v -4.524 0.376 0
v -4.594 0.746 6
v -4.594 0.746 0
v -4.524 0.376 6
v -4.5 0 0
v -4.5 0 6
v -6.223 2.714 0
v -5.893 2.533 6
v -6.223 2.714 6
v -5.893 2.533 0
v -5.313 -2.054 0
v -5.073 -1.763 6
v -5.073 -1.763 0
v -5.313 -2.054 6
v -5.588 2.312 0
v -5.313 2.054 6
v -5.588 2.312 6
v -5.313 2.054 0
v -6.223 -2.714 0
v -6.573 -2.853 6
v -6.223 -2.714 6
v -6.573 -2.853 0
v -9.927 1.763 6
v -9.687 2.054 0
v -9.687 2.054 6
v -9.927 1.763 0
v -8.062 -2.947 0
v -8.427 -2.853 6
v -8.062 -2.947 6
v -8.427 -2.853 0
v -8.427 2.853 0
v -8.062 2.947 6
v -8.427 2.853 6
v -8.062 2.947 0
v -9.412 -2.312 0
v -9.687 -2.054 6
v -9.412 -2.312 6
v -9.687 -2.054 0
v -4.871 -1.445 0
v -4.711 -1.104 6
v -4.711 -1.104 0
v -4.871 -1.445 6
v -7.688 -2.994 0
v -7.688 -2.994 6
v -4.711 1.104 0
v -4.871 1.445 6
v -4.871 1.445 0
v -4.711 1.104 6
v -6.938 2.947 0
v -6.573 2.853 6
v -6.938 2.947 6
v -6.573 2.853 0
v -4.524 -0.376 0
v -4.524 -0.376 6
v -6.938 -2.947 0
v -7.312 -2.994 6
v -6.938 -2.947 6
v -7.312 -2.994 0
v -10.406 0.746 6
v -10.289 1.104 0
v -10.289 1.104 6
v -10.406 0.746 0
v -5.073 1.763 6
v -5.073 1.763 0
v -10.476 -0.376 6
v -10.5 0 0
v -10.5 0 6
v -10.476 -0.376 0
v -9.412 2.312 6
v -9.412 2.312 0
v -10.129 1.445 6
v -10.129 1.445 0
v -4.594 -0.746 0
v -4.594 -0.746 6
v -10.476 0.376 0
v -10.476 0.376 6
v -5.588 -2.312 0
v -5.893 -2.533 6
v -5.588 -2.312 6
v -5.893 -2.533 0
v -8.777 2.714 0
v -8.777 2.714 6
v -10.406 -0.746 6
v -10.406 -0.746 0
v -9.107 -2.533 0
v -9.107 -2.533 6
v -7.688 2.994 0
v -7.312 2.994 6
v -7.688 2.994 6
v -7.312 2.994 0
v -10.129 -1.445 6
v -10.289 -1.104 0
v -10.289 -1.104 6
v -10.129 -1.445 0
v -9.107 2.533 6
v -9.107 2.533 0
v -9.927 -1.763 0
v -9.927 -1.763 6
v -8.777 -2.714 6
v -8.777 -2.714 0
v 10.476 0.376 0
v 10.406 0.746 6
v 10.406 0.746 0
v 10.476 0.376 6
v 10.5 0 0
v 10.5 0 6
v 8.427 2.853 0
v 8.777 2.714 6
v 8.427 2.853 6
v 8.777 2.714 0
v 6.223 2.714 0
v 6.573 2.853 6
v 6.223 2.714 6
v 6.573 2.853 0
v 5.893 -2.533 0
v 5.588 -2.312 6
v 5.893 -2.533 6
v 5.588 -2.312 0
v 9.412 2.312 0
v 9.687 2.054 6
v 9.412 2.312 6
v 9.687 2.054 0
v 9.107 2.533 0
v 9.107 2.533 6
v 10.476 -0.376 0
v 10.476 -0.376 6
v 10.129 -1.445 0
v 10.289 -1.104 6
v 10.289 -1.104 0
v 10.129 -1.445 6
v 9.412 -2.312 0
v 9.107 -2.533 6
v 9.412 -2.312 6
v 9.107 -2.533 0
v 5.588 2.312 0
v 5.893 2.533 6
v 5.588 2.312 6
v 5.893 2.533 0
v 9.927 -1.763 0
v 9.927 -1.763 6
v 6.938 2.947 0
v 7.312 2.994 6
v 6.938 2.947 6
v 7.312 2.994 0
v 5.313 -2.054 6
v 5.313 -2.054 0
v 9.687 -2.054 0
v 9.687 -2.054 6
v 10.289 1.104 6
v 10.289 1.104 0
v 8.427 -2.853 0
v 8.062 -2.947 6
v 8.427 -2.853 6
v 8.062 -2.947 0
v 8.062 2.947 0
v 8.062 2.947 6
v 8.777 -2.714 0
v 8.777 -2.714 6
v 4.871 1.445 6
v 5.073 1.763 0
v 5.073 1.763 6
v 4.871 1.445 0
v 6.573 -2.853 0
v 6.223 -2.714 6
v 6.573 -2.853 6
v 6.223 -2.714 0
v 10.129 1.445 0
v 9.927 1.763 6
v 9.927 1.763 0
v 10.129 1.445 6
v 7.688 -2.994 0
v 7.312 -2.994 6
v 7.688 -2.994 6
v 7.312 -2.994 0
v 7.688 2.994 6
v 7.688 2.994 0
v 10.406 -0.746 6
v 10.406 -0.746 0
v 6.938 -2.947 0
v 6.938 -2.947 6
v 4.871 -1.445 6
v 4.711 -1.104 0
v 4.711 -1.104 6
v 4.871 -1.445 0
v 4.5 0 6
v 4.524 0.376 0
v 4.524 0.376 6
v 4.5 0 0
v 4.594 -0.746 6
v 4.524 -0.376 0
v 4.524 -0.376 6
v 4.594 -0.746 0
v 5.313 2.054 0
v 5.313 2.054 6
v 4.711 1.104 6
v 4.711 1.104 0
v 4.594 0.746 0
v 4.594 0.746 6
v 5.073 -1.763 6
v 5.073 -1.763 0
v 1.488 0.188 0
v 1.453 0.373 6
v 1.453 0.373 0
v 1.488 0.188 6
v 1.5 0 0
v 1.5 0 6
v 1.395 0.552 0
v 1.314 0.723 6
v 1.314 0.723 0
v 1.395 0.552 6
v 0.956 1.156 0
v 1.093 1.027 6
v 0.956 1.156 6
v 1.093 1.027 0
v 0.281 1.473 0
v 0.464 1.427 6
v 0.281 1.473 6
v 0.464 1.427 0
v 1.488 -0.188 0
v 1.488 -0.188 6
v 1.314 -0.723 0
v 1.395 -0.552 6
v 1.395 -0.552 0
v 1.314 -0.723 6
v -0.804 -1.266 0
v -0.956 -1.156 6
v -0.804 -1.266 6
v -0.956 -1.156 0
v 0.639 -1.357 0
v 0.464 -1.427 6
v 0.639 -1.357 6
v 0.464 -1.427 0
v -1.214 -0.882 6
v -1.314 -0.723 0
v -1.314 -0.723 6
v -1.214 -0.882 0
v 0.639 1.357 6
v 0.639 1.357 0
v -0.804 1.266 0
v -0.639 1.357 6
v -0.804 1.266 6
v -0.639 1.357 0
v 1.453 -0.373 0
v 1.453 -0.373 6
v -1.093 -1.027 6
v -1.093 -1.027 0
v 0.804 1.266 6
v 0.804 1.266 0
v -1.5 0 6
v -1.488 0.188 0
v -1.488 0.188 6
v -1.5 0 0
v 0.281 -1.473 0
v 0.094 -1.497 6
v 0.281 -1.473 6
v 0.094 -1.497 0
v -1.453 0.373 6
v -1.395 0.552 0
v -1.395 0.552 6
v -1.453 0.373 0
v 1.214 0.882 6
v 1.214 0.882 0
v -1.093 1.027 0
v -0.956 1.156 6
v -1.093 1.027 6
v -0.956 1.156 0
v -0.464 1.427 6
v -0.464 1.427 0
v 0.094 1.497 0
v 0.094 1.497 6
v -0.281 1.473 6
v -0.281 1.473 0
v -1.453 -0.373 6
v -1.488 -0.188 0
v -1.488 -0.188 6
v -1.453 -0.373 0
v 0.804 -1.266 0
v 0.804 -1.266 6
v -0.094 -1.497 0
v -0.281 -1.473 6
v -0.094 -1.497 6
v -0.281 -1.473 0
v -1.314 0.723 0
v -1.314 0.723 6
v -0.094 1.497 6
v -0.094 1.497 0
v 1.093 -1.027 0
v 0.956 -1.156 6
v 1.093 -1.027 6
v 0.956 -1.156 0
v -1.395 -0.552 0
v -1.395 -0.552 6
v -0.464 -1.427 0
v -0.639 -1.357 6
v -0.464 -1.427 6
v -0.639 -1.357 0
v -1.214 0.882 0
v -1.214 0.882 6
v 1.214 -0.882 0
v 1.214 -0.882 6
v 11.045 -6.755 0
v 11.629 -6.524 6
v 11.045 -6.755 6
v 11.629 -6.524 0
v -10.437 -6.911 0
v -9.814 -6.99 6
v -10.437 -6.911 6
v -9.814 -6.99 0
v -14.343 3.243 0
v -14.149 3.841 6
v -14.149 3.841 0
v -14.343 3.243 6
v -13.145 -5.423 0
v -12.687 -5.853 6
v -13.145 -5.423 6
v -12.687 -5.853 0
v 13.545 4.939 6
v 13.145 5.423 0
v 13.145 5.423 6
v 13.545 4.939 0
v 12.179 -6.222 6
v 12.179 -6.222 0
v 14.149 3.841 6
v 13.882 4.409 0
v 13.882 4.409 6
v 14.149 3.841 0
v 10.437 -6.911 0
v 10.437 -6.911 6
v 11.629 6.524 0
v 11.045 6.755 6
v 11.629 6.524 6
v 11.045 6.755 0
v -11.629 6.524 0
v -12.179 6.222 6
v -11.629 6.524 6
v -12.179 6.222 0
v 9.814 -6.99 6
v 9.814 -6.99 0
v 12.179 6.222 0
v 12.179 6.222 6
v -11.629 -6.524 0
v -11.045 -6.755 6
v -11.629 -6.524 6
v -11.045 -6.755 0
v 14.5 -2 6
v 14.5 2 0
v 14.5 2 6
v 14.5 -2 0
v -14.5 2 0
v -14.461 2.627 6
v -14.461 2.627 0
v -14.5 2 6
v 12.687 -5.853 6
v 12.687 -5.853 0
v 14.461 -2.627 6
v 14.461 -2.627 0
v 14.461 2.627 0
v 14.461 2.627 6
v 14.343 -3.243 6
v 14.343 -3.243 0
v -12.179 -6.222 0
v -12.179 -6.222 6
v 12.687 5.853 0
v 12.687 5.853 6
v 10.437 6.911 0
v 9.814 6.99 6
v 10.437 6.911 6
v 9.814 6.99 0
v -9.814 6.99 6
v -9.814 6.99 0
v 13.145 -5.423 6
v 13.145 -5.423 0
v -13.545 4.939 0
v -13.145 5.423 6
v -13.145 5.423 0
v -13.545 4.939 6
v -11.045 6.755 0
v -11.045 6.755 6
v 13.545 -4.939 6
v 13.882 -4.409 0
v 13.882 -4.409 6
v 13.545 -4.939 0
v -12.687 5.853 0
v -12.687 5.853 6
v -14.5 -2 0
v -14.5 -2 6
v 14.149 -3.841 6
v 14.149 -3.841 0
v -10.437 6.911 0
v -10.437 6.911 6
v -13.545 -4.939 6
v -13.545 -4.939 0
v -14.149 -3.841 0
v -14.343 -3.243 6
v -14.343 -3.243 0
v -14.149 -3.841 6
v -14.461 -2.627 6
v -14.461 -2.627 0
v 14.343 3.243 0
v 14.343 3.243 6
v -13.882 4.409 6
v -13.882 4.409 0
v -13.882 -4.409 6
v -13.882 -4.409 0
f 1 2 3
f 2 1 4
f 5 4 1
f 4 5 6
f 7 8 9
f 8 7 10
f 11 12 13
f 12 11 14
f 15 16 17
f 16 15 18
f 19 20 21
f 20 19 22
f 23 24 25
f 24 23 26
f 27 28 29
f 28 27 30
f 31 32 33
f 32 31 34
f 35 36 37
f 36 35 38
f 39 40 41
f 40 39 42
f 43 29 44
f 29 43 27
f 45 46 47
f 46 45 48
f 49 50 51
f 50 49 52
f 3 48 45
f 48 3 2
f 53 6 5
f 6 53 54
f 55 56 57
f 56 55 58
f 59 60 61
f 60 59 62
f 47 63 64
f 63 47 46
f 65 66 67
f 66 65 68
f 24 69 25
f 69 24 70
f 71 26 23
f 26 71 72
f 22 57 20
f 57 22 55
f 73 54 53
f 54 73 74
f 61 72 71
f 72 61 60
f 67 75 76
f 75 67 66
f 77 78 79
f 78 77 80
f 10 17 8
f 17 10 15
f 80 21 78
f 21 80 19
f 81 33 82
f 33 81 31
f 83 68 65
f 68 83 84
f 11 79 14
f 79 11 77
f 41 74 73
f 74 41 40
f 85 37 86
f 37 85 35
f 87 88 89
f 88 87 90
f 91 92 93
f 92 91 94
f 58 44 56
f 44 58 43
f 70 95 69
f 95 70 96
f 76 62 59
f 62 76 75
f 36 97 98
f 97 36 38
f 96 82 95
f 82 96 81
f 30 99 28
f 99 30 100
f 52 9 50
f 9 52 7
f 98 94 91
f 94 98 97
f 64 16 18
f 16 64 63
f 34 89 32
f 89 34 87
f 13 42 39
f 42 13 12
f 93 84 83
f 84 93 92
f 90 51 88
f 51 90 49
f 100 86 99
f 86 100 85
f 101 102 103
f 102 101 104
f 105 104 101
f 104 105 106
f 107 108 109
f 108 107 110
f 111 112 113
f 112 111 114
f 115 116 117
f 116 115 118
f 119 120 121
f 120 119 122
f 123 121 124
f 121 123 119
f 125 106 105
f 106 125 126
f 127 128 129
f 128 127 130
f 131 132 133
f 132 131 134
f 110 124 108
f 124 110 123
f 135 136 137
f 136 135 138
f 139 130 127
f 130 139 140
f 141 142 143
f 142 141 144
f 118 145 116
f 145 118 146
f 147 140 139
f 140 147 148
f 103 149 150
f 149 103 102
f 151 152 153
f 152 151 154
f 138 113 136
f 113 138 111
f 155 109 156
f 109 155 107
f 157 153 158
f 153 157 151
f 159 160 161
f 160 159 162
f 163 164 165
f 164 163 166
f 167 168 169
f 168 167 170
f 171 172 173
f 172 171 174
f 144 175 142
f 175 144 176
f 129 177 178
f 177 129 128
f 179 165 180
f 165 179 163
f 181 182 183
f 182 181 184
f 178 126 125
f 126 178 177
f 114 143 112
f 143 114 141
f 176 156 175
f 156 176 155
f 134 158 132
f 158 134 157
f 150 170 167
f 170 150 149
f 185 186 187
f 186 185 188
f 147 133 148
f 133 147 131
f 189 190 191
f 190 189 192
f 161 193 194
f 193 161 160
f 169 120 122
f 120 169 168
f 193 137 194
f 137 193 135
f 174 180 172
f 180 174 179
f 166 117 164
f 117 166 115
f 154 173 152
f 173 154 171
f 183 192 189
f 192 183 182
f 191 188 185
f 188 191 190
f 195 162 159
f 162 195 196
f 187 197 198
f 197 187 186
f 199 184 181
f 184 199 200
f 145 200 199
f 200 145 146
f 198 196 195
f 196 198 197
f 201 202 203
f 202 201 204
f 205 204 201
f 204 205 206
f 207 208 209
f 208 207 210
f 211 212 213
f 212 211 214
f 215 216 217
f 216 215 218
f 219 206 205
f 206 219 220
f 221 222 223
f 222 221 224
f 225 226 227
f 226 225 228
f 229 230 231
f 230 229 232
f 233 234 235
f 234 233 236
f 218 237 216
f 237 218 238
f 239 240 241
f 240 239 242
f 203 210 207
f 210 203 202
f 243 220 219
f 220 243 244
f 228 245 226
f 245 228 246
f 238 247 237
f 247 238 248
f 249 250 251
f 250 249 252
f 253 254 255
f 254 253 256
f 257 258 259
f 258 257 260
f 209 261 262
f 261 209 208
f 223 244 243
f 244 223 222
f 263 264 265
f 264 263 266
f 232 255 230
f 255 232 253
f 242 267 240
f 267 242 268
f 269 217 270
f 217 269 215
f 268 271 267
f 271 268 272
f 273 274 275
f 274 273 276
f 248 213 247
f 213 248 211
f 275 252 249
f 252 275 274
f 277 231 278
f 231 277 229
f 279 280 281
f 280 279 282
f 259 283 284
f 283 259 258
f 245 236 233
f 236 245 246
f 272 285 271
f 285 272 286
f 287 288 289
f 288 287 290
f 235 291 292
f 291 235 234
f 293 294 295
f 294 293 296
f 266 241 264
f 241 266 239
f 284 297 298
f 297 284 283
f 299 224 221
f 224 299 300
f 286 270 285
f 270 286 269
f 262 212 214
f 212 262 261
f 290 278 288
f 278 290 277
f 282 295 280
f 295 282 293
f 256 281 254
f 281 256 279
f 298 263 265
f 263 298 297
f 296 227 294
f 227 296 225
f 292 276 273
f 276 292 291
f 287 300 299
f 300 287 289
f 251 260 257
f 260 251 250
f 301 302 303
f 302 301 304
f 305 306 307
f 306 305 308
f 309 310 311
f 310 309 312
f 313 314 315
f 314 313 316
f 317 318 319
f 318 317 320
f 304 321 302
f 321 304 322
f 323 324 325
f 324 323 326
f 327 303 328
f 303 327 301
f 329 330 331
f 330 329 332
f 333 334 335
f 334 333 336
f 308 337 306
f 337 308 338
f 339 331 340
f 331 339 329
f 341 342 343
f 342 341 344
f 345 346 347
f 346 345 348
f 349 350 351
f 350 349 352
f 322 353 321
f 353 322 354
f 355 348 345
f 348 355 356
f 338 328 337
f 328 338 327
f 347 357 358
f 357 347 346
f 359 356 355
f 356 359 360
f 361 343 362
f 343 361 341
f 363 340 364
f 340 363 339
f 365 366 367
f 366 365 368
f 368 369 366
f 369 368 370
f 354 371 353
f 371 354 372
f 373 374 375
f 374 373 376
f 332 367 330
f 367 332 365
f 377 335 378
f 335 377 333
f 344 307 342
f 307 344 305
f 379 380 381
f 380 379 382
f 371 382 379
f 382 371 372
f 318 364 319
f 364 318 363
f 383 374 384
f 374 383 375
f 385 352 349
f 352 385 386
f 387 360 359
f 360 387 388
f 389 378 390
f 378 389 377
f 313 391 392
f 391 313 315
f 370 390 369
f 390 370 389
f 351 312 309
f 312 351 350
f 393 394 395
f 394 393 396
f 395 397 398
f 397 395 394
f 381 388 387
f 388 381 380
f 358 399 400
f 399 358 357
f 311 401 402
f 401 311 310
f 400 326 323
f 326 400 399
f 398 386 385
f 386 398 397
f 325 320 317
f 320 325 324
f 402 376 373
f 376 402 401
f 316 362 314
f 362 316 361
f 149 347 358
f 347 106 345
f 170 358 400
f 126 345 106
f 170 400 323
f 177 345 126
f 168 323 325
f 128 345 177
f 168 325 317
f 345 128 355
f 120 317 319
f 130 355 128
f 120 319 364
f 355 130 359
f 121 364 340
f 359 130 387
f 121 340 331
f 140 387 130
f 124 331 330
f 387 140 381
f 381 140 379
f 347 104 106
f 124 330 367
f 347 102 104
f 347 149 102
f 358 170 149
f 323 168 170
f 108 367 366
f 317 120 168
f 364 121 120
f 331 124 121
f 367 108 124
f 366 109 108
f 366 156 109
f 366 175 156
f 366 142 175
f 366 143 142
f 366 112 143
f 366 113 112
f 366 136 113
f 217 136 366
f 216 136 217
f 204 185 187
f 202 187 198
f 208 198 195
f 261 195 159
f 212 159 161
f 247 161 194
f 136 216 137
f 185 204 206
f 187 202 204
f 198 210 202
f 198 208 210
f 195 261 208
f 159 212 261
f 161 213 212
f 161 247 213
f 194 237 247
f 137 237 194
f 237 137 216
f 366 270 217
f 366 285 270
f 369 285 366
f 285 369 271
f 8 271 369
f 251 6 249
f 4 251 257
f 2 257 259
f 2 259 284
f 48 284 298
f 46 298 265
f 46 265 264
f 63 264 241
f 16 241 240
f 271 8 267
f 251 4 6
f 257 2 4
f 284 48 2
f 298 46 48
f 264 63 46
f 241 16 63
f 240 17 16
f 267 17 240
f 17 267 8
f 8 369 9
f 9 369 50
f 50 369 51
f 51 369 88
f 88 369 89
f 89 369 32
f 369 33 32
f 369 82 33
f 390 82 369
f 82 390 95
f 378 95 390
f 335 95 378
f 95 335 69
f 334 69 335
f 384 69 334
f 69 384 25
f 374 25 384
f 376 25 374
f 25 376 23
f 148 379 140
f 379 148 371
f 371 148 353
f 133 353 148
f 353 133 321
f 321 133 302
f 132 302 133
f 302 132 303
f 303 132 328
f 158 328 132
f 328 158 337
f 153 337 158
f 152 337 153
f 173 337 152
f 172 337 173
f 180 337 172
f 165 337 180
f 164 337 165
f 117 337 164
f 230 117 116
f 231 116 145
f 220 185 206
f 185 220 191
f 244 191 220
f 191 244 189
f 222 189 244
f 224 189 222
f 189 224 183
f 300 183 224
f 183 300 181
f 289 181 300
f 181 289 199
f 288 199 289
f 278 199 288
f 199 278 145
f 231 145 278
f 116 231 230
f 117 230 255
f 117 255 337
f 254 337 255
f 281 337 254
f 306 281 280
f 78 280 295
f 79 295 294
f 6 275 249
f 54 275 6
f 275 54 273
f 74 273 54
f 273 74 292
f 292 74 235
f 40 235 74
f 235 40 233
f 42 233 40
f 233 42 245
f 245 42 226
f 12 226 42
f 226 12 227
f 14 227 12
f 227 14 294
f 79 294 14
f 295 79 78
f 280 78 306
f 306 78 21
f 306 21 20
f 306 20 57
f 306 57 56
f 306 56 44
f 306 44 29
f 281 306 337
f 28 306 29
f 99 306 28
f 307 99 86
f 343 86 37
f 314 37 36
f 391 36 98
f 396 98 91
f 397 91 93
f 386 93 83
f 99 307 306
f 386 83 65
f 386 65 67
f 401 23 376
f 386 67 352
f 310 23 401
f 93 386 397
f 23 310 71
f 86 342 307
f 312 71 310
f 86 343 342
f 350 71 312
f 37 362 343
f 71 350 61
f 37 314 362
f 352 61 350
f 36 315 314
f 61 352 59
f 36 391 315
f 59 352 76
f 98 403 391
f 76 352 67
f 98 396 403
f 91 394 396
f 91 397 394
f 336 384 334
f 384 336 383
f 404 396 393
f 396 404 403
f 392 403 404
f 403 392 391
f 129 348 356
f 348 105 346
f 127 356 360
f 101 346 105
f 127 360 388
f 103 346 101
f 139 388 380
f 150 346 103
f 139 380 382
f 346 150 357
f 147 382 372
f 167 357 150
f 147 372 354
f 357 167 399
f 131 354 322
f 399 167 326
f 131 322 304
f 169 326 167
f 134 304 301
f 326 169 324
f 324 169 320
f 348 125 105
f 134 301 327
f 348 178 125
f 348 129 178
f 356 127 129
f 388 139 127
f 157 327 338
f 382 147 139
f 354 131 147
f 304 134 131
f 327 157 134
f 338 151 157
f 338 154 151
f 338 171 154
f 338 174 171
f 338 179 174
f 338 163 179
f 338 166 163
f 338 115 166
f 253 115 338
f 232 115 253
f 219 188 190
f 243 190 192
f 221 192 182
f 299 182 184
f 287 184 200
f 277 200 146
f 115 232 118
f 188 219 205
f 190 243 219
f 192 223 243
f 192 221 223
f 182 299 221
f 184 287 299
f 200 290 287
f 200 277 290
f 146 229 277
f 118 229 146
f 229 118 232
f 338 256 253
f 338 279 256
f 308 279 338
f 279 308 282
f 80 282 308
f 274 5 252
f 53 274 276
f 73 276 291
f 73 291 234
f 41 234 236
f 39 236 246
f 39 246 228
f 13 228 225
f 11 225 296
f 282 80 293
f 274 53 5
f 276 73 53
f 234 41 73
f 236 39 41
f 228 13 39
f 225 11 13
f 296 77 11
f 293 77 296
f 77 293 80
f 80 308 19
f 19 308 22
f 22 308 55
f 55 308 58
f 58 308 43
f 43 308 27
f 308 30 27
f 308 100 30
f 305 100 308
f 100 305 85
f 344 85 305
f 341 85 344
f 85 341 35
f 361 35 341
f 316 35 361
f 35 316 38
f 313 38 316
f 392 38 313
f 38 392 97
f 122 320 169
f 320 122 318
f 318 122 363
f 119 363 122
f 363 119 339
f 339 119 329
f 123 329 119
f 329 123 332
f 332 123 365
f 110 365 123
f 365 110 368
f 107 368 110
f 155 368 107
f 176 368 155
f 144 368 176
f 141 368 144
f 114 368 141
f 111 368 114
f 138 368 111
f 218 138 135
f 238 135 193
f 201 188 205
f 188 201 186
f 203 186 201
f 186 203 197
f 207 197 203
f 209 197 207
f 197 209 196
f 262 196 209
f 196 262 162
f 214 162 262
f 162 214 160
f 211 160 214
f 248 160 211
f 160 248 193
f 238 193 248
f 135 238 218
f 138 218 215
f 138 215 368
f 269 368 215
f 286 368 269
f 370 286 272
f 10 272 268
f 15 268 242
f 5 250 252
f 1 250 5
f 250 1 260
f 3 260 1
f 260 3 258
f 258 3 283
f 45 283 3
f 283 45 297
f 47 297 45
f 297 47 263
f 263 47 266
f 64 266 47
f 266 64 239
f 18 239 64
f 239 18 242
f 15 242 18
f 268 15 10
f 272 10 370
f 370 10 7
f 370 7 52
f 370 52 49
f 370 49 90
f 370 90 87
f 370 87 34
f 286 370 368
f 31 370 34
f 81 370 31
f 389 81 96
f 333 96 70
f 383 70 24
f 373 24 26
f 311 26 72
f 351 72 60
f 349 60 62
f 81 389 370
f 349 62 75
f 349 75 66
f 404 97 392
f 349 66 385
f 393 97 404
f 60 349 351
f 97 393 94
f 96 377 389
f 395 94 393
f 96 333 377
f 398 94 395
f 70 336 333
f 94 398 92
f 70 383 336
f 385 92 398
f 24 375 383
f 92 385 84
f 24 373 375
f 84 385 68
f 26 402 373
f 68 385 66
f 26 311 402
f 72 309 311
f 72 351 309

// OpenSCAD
$fn = 50;


difference() {
	union() {
		*color(alpha = 1.0000000000, c = "gray") {
			translate(v = [0, 7, 0]) {
				linear_extrude(height = 1) {
					text(font = "Arial:style=Bold", halign = "center", size = 4.5000000000, text = "COMMENT plate main", valign = "center");
				}
			}
		}
		*color(alpha = 1.0000000000, c = "gray") {
			translate(v = [0, 14, 0]) {
				linear_extrude(height = 1) {
					text(font = "Arial:style=Bold", halign = "center", size = 4.5000000000, text = "COMMENT description oobb_plate_shape_p_type_6_depth_2_width_1_height_6_thickness_true_both_holes", valign = "center");
				}
			}
		}
		hull() {
			translate(v = [-9.5000000000, 2.0000000000, 0]) {
				cylinder(h = 6, r = 5);
			}
			translate(v = [9.5000000000, 2.0000000000, 0]) {
				cylinder(h = 6, r = 5);
			}
			translate(v = [-9.5000000000, -2.0000000000, 0]) {
				cylinder(h = 6, r = 5);
			}
			translate(v = [9.5000000000, -2.0000000000, 0]) {
				cylinder(h = 6, r = 5);
			}
		}
	}
	union() {
		*color(alpha = 1.0000000000, c = "gray") {
			translate(v = [0, 7, 0]) {
				linear_extrude(height = 1) {
					text(font = "Arial:style=Bold", halign = "center", size = 4.5000000000, text = "COMMENT holes main", valign = "center");
				}
			}
		}
		*color(alpha = 1.0000000000, c = "gray") {
			translate(v = [0, 14, 0]) {
				linear_extrude(height = 1) {
					text(font = "Arial:style=Bold", halign = "center", size = 4.5000000000, text = "COMMENT description oobb_holes_shape_n_type_2_width_1_height_6_thickness_true_both_holes", valign = "center");
				}
			}
		}
		translate(v = [-7.5000000000, 0.0000000000, 0]) {
			translate(v = [0, 0, -50]) {
				cylinder(h = 100, r = 3.0000000000);
			}
		}
		translate(v = [7.5000000000, 0.0000000000, 0]) {
			translate(v = [0, 0, -50]) {
				cylinder(h = 100, r = 3.0000000000);
			}
		}
		translate(v = [-7.5000000000, 0.0000000000, 0]) {
			translate(v = [0, 0, -50]) {
				cylinder(h = 100, r = 1.5000000000);
			}
		}
		translate(v = [0, 0, -50]) {
			cylinder(h = 100, r = 1.5000000000);
		}
		translate(v = [7.5000000000, 0.0000000000, 0]) {
			translate(v = [0, 0, -50]) {
				cylinder(h = 100, r = 1.5000000000);
			}
		}
	}
}
